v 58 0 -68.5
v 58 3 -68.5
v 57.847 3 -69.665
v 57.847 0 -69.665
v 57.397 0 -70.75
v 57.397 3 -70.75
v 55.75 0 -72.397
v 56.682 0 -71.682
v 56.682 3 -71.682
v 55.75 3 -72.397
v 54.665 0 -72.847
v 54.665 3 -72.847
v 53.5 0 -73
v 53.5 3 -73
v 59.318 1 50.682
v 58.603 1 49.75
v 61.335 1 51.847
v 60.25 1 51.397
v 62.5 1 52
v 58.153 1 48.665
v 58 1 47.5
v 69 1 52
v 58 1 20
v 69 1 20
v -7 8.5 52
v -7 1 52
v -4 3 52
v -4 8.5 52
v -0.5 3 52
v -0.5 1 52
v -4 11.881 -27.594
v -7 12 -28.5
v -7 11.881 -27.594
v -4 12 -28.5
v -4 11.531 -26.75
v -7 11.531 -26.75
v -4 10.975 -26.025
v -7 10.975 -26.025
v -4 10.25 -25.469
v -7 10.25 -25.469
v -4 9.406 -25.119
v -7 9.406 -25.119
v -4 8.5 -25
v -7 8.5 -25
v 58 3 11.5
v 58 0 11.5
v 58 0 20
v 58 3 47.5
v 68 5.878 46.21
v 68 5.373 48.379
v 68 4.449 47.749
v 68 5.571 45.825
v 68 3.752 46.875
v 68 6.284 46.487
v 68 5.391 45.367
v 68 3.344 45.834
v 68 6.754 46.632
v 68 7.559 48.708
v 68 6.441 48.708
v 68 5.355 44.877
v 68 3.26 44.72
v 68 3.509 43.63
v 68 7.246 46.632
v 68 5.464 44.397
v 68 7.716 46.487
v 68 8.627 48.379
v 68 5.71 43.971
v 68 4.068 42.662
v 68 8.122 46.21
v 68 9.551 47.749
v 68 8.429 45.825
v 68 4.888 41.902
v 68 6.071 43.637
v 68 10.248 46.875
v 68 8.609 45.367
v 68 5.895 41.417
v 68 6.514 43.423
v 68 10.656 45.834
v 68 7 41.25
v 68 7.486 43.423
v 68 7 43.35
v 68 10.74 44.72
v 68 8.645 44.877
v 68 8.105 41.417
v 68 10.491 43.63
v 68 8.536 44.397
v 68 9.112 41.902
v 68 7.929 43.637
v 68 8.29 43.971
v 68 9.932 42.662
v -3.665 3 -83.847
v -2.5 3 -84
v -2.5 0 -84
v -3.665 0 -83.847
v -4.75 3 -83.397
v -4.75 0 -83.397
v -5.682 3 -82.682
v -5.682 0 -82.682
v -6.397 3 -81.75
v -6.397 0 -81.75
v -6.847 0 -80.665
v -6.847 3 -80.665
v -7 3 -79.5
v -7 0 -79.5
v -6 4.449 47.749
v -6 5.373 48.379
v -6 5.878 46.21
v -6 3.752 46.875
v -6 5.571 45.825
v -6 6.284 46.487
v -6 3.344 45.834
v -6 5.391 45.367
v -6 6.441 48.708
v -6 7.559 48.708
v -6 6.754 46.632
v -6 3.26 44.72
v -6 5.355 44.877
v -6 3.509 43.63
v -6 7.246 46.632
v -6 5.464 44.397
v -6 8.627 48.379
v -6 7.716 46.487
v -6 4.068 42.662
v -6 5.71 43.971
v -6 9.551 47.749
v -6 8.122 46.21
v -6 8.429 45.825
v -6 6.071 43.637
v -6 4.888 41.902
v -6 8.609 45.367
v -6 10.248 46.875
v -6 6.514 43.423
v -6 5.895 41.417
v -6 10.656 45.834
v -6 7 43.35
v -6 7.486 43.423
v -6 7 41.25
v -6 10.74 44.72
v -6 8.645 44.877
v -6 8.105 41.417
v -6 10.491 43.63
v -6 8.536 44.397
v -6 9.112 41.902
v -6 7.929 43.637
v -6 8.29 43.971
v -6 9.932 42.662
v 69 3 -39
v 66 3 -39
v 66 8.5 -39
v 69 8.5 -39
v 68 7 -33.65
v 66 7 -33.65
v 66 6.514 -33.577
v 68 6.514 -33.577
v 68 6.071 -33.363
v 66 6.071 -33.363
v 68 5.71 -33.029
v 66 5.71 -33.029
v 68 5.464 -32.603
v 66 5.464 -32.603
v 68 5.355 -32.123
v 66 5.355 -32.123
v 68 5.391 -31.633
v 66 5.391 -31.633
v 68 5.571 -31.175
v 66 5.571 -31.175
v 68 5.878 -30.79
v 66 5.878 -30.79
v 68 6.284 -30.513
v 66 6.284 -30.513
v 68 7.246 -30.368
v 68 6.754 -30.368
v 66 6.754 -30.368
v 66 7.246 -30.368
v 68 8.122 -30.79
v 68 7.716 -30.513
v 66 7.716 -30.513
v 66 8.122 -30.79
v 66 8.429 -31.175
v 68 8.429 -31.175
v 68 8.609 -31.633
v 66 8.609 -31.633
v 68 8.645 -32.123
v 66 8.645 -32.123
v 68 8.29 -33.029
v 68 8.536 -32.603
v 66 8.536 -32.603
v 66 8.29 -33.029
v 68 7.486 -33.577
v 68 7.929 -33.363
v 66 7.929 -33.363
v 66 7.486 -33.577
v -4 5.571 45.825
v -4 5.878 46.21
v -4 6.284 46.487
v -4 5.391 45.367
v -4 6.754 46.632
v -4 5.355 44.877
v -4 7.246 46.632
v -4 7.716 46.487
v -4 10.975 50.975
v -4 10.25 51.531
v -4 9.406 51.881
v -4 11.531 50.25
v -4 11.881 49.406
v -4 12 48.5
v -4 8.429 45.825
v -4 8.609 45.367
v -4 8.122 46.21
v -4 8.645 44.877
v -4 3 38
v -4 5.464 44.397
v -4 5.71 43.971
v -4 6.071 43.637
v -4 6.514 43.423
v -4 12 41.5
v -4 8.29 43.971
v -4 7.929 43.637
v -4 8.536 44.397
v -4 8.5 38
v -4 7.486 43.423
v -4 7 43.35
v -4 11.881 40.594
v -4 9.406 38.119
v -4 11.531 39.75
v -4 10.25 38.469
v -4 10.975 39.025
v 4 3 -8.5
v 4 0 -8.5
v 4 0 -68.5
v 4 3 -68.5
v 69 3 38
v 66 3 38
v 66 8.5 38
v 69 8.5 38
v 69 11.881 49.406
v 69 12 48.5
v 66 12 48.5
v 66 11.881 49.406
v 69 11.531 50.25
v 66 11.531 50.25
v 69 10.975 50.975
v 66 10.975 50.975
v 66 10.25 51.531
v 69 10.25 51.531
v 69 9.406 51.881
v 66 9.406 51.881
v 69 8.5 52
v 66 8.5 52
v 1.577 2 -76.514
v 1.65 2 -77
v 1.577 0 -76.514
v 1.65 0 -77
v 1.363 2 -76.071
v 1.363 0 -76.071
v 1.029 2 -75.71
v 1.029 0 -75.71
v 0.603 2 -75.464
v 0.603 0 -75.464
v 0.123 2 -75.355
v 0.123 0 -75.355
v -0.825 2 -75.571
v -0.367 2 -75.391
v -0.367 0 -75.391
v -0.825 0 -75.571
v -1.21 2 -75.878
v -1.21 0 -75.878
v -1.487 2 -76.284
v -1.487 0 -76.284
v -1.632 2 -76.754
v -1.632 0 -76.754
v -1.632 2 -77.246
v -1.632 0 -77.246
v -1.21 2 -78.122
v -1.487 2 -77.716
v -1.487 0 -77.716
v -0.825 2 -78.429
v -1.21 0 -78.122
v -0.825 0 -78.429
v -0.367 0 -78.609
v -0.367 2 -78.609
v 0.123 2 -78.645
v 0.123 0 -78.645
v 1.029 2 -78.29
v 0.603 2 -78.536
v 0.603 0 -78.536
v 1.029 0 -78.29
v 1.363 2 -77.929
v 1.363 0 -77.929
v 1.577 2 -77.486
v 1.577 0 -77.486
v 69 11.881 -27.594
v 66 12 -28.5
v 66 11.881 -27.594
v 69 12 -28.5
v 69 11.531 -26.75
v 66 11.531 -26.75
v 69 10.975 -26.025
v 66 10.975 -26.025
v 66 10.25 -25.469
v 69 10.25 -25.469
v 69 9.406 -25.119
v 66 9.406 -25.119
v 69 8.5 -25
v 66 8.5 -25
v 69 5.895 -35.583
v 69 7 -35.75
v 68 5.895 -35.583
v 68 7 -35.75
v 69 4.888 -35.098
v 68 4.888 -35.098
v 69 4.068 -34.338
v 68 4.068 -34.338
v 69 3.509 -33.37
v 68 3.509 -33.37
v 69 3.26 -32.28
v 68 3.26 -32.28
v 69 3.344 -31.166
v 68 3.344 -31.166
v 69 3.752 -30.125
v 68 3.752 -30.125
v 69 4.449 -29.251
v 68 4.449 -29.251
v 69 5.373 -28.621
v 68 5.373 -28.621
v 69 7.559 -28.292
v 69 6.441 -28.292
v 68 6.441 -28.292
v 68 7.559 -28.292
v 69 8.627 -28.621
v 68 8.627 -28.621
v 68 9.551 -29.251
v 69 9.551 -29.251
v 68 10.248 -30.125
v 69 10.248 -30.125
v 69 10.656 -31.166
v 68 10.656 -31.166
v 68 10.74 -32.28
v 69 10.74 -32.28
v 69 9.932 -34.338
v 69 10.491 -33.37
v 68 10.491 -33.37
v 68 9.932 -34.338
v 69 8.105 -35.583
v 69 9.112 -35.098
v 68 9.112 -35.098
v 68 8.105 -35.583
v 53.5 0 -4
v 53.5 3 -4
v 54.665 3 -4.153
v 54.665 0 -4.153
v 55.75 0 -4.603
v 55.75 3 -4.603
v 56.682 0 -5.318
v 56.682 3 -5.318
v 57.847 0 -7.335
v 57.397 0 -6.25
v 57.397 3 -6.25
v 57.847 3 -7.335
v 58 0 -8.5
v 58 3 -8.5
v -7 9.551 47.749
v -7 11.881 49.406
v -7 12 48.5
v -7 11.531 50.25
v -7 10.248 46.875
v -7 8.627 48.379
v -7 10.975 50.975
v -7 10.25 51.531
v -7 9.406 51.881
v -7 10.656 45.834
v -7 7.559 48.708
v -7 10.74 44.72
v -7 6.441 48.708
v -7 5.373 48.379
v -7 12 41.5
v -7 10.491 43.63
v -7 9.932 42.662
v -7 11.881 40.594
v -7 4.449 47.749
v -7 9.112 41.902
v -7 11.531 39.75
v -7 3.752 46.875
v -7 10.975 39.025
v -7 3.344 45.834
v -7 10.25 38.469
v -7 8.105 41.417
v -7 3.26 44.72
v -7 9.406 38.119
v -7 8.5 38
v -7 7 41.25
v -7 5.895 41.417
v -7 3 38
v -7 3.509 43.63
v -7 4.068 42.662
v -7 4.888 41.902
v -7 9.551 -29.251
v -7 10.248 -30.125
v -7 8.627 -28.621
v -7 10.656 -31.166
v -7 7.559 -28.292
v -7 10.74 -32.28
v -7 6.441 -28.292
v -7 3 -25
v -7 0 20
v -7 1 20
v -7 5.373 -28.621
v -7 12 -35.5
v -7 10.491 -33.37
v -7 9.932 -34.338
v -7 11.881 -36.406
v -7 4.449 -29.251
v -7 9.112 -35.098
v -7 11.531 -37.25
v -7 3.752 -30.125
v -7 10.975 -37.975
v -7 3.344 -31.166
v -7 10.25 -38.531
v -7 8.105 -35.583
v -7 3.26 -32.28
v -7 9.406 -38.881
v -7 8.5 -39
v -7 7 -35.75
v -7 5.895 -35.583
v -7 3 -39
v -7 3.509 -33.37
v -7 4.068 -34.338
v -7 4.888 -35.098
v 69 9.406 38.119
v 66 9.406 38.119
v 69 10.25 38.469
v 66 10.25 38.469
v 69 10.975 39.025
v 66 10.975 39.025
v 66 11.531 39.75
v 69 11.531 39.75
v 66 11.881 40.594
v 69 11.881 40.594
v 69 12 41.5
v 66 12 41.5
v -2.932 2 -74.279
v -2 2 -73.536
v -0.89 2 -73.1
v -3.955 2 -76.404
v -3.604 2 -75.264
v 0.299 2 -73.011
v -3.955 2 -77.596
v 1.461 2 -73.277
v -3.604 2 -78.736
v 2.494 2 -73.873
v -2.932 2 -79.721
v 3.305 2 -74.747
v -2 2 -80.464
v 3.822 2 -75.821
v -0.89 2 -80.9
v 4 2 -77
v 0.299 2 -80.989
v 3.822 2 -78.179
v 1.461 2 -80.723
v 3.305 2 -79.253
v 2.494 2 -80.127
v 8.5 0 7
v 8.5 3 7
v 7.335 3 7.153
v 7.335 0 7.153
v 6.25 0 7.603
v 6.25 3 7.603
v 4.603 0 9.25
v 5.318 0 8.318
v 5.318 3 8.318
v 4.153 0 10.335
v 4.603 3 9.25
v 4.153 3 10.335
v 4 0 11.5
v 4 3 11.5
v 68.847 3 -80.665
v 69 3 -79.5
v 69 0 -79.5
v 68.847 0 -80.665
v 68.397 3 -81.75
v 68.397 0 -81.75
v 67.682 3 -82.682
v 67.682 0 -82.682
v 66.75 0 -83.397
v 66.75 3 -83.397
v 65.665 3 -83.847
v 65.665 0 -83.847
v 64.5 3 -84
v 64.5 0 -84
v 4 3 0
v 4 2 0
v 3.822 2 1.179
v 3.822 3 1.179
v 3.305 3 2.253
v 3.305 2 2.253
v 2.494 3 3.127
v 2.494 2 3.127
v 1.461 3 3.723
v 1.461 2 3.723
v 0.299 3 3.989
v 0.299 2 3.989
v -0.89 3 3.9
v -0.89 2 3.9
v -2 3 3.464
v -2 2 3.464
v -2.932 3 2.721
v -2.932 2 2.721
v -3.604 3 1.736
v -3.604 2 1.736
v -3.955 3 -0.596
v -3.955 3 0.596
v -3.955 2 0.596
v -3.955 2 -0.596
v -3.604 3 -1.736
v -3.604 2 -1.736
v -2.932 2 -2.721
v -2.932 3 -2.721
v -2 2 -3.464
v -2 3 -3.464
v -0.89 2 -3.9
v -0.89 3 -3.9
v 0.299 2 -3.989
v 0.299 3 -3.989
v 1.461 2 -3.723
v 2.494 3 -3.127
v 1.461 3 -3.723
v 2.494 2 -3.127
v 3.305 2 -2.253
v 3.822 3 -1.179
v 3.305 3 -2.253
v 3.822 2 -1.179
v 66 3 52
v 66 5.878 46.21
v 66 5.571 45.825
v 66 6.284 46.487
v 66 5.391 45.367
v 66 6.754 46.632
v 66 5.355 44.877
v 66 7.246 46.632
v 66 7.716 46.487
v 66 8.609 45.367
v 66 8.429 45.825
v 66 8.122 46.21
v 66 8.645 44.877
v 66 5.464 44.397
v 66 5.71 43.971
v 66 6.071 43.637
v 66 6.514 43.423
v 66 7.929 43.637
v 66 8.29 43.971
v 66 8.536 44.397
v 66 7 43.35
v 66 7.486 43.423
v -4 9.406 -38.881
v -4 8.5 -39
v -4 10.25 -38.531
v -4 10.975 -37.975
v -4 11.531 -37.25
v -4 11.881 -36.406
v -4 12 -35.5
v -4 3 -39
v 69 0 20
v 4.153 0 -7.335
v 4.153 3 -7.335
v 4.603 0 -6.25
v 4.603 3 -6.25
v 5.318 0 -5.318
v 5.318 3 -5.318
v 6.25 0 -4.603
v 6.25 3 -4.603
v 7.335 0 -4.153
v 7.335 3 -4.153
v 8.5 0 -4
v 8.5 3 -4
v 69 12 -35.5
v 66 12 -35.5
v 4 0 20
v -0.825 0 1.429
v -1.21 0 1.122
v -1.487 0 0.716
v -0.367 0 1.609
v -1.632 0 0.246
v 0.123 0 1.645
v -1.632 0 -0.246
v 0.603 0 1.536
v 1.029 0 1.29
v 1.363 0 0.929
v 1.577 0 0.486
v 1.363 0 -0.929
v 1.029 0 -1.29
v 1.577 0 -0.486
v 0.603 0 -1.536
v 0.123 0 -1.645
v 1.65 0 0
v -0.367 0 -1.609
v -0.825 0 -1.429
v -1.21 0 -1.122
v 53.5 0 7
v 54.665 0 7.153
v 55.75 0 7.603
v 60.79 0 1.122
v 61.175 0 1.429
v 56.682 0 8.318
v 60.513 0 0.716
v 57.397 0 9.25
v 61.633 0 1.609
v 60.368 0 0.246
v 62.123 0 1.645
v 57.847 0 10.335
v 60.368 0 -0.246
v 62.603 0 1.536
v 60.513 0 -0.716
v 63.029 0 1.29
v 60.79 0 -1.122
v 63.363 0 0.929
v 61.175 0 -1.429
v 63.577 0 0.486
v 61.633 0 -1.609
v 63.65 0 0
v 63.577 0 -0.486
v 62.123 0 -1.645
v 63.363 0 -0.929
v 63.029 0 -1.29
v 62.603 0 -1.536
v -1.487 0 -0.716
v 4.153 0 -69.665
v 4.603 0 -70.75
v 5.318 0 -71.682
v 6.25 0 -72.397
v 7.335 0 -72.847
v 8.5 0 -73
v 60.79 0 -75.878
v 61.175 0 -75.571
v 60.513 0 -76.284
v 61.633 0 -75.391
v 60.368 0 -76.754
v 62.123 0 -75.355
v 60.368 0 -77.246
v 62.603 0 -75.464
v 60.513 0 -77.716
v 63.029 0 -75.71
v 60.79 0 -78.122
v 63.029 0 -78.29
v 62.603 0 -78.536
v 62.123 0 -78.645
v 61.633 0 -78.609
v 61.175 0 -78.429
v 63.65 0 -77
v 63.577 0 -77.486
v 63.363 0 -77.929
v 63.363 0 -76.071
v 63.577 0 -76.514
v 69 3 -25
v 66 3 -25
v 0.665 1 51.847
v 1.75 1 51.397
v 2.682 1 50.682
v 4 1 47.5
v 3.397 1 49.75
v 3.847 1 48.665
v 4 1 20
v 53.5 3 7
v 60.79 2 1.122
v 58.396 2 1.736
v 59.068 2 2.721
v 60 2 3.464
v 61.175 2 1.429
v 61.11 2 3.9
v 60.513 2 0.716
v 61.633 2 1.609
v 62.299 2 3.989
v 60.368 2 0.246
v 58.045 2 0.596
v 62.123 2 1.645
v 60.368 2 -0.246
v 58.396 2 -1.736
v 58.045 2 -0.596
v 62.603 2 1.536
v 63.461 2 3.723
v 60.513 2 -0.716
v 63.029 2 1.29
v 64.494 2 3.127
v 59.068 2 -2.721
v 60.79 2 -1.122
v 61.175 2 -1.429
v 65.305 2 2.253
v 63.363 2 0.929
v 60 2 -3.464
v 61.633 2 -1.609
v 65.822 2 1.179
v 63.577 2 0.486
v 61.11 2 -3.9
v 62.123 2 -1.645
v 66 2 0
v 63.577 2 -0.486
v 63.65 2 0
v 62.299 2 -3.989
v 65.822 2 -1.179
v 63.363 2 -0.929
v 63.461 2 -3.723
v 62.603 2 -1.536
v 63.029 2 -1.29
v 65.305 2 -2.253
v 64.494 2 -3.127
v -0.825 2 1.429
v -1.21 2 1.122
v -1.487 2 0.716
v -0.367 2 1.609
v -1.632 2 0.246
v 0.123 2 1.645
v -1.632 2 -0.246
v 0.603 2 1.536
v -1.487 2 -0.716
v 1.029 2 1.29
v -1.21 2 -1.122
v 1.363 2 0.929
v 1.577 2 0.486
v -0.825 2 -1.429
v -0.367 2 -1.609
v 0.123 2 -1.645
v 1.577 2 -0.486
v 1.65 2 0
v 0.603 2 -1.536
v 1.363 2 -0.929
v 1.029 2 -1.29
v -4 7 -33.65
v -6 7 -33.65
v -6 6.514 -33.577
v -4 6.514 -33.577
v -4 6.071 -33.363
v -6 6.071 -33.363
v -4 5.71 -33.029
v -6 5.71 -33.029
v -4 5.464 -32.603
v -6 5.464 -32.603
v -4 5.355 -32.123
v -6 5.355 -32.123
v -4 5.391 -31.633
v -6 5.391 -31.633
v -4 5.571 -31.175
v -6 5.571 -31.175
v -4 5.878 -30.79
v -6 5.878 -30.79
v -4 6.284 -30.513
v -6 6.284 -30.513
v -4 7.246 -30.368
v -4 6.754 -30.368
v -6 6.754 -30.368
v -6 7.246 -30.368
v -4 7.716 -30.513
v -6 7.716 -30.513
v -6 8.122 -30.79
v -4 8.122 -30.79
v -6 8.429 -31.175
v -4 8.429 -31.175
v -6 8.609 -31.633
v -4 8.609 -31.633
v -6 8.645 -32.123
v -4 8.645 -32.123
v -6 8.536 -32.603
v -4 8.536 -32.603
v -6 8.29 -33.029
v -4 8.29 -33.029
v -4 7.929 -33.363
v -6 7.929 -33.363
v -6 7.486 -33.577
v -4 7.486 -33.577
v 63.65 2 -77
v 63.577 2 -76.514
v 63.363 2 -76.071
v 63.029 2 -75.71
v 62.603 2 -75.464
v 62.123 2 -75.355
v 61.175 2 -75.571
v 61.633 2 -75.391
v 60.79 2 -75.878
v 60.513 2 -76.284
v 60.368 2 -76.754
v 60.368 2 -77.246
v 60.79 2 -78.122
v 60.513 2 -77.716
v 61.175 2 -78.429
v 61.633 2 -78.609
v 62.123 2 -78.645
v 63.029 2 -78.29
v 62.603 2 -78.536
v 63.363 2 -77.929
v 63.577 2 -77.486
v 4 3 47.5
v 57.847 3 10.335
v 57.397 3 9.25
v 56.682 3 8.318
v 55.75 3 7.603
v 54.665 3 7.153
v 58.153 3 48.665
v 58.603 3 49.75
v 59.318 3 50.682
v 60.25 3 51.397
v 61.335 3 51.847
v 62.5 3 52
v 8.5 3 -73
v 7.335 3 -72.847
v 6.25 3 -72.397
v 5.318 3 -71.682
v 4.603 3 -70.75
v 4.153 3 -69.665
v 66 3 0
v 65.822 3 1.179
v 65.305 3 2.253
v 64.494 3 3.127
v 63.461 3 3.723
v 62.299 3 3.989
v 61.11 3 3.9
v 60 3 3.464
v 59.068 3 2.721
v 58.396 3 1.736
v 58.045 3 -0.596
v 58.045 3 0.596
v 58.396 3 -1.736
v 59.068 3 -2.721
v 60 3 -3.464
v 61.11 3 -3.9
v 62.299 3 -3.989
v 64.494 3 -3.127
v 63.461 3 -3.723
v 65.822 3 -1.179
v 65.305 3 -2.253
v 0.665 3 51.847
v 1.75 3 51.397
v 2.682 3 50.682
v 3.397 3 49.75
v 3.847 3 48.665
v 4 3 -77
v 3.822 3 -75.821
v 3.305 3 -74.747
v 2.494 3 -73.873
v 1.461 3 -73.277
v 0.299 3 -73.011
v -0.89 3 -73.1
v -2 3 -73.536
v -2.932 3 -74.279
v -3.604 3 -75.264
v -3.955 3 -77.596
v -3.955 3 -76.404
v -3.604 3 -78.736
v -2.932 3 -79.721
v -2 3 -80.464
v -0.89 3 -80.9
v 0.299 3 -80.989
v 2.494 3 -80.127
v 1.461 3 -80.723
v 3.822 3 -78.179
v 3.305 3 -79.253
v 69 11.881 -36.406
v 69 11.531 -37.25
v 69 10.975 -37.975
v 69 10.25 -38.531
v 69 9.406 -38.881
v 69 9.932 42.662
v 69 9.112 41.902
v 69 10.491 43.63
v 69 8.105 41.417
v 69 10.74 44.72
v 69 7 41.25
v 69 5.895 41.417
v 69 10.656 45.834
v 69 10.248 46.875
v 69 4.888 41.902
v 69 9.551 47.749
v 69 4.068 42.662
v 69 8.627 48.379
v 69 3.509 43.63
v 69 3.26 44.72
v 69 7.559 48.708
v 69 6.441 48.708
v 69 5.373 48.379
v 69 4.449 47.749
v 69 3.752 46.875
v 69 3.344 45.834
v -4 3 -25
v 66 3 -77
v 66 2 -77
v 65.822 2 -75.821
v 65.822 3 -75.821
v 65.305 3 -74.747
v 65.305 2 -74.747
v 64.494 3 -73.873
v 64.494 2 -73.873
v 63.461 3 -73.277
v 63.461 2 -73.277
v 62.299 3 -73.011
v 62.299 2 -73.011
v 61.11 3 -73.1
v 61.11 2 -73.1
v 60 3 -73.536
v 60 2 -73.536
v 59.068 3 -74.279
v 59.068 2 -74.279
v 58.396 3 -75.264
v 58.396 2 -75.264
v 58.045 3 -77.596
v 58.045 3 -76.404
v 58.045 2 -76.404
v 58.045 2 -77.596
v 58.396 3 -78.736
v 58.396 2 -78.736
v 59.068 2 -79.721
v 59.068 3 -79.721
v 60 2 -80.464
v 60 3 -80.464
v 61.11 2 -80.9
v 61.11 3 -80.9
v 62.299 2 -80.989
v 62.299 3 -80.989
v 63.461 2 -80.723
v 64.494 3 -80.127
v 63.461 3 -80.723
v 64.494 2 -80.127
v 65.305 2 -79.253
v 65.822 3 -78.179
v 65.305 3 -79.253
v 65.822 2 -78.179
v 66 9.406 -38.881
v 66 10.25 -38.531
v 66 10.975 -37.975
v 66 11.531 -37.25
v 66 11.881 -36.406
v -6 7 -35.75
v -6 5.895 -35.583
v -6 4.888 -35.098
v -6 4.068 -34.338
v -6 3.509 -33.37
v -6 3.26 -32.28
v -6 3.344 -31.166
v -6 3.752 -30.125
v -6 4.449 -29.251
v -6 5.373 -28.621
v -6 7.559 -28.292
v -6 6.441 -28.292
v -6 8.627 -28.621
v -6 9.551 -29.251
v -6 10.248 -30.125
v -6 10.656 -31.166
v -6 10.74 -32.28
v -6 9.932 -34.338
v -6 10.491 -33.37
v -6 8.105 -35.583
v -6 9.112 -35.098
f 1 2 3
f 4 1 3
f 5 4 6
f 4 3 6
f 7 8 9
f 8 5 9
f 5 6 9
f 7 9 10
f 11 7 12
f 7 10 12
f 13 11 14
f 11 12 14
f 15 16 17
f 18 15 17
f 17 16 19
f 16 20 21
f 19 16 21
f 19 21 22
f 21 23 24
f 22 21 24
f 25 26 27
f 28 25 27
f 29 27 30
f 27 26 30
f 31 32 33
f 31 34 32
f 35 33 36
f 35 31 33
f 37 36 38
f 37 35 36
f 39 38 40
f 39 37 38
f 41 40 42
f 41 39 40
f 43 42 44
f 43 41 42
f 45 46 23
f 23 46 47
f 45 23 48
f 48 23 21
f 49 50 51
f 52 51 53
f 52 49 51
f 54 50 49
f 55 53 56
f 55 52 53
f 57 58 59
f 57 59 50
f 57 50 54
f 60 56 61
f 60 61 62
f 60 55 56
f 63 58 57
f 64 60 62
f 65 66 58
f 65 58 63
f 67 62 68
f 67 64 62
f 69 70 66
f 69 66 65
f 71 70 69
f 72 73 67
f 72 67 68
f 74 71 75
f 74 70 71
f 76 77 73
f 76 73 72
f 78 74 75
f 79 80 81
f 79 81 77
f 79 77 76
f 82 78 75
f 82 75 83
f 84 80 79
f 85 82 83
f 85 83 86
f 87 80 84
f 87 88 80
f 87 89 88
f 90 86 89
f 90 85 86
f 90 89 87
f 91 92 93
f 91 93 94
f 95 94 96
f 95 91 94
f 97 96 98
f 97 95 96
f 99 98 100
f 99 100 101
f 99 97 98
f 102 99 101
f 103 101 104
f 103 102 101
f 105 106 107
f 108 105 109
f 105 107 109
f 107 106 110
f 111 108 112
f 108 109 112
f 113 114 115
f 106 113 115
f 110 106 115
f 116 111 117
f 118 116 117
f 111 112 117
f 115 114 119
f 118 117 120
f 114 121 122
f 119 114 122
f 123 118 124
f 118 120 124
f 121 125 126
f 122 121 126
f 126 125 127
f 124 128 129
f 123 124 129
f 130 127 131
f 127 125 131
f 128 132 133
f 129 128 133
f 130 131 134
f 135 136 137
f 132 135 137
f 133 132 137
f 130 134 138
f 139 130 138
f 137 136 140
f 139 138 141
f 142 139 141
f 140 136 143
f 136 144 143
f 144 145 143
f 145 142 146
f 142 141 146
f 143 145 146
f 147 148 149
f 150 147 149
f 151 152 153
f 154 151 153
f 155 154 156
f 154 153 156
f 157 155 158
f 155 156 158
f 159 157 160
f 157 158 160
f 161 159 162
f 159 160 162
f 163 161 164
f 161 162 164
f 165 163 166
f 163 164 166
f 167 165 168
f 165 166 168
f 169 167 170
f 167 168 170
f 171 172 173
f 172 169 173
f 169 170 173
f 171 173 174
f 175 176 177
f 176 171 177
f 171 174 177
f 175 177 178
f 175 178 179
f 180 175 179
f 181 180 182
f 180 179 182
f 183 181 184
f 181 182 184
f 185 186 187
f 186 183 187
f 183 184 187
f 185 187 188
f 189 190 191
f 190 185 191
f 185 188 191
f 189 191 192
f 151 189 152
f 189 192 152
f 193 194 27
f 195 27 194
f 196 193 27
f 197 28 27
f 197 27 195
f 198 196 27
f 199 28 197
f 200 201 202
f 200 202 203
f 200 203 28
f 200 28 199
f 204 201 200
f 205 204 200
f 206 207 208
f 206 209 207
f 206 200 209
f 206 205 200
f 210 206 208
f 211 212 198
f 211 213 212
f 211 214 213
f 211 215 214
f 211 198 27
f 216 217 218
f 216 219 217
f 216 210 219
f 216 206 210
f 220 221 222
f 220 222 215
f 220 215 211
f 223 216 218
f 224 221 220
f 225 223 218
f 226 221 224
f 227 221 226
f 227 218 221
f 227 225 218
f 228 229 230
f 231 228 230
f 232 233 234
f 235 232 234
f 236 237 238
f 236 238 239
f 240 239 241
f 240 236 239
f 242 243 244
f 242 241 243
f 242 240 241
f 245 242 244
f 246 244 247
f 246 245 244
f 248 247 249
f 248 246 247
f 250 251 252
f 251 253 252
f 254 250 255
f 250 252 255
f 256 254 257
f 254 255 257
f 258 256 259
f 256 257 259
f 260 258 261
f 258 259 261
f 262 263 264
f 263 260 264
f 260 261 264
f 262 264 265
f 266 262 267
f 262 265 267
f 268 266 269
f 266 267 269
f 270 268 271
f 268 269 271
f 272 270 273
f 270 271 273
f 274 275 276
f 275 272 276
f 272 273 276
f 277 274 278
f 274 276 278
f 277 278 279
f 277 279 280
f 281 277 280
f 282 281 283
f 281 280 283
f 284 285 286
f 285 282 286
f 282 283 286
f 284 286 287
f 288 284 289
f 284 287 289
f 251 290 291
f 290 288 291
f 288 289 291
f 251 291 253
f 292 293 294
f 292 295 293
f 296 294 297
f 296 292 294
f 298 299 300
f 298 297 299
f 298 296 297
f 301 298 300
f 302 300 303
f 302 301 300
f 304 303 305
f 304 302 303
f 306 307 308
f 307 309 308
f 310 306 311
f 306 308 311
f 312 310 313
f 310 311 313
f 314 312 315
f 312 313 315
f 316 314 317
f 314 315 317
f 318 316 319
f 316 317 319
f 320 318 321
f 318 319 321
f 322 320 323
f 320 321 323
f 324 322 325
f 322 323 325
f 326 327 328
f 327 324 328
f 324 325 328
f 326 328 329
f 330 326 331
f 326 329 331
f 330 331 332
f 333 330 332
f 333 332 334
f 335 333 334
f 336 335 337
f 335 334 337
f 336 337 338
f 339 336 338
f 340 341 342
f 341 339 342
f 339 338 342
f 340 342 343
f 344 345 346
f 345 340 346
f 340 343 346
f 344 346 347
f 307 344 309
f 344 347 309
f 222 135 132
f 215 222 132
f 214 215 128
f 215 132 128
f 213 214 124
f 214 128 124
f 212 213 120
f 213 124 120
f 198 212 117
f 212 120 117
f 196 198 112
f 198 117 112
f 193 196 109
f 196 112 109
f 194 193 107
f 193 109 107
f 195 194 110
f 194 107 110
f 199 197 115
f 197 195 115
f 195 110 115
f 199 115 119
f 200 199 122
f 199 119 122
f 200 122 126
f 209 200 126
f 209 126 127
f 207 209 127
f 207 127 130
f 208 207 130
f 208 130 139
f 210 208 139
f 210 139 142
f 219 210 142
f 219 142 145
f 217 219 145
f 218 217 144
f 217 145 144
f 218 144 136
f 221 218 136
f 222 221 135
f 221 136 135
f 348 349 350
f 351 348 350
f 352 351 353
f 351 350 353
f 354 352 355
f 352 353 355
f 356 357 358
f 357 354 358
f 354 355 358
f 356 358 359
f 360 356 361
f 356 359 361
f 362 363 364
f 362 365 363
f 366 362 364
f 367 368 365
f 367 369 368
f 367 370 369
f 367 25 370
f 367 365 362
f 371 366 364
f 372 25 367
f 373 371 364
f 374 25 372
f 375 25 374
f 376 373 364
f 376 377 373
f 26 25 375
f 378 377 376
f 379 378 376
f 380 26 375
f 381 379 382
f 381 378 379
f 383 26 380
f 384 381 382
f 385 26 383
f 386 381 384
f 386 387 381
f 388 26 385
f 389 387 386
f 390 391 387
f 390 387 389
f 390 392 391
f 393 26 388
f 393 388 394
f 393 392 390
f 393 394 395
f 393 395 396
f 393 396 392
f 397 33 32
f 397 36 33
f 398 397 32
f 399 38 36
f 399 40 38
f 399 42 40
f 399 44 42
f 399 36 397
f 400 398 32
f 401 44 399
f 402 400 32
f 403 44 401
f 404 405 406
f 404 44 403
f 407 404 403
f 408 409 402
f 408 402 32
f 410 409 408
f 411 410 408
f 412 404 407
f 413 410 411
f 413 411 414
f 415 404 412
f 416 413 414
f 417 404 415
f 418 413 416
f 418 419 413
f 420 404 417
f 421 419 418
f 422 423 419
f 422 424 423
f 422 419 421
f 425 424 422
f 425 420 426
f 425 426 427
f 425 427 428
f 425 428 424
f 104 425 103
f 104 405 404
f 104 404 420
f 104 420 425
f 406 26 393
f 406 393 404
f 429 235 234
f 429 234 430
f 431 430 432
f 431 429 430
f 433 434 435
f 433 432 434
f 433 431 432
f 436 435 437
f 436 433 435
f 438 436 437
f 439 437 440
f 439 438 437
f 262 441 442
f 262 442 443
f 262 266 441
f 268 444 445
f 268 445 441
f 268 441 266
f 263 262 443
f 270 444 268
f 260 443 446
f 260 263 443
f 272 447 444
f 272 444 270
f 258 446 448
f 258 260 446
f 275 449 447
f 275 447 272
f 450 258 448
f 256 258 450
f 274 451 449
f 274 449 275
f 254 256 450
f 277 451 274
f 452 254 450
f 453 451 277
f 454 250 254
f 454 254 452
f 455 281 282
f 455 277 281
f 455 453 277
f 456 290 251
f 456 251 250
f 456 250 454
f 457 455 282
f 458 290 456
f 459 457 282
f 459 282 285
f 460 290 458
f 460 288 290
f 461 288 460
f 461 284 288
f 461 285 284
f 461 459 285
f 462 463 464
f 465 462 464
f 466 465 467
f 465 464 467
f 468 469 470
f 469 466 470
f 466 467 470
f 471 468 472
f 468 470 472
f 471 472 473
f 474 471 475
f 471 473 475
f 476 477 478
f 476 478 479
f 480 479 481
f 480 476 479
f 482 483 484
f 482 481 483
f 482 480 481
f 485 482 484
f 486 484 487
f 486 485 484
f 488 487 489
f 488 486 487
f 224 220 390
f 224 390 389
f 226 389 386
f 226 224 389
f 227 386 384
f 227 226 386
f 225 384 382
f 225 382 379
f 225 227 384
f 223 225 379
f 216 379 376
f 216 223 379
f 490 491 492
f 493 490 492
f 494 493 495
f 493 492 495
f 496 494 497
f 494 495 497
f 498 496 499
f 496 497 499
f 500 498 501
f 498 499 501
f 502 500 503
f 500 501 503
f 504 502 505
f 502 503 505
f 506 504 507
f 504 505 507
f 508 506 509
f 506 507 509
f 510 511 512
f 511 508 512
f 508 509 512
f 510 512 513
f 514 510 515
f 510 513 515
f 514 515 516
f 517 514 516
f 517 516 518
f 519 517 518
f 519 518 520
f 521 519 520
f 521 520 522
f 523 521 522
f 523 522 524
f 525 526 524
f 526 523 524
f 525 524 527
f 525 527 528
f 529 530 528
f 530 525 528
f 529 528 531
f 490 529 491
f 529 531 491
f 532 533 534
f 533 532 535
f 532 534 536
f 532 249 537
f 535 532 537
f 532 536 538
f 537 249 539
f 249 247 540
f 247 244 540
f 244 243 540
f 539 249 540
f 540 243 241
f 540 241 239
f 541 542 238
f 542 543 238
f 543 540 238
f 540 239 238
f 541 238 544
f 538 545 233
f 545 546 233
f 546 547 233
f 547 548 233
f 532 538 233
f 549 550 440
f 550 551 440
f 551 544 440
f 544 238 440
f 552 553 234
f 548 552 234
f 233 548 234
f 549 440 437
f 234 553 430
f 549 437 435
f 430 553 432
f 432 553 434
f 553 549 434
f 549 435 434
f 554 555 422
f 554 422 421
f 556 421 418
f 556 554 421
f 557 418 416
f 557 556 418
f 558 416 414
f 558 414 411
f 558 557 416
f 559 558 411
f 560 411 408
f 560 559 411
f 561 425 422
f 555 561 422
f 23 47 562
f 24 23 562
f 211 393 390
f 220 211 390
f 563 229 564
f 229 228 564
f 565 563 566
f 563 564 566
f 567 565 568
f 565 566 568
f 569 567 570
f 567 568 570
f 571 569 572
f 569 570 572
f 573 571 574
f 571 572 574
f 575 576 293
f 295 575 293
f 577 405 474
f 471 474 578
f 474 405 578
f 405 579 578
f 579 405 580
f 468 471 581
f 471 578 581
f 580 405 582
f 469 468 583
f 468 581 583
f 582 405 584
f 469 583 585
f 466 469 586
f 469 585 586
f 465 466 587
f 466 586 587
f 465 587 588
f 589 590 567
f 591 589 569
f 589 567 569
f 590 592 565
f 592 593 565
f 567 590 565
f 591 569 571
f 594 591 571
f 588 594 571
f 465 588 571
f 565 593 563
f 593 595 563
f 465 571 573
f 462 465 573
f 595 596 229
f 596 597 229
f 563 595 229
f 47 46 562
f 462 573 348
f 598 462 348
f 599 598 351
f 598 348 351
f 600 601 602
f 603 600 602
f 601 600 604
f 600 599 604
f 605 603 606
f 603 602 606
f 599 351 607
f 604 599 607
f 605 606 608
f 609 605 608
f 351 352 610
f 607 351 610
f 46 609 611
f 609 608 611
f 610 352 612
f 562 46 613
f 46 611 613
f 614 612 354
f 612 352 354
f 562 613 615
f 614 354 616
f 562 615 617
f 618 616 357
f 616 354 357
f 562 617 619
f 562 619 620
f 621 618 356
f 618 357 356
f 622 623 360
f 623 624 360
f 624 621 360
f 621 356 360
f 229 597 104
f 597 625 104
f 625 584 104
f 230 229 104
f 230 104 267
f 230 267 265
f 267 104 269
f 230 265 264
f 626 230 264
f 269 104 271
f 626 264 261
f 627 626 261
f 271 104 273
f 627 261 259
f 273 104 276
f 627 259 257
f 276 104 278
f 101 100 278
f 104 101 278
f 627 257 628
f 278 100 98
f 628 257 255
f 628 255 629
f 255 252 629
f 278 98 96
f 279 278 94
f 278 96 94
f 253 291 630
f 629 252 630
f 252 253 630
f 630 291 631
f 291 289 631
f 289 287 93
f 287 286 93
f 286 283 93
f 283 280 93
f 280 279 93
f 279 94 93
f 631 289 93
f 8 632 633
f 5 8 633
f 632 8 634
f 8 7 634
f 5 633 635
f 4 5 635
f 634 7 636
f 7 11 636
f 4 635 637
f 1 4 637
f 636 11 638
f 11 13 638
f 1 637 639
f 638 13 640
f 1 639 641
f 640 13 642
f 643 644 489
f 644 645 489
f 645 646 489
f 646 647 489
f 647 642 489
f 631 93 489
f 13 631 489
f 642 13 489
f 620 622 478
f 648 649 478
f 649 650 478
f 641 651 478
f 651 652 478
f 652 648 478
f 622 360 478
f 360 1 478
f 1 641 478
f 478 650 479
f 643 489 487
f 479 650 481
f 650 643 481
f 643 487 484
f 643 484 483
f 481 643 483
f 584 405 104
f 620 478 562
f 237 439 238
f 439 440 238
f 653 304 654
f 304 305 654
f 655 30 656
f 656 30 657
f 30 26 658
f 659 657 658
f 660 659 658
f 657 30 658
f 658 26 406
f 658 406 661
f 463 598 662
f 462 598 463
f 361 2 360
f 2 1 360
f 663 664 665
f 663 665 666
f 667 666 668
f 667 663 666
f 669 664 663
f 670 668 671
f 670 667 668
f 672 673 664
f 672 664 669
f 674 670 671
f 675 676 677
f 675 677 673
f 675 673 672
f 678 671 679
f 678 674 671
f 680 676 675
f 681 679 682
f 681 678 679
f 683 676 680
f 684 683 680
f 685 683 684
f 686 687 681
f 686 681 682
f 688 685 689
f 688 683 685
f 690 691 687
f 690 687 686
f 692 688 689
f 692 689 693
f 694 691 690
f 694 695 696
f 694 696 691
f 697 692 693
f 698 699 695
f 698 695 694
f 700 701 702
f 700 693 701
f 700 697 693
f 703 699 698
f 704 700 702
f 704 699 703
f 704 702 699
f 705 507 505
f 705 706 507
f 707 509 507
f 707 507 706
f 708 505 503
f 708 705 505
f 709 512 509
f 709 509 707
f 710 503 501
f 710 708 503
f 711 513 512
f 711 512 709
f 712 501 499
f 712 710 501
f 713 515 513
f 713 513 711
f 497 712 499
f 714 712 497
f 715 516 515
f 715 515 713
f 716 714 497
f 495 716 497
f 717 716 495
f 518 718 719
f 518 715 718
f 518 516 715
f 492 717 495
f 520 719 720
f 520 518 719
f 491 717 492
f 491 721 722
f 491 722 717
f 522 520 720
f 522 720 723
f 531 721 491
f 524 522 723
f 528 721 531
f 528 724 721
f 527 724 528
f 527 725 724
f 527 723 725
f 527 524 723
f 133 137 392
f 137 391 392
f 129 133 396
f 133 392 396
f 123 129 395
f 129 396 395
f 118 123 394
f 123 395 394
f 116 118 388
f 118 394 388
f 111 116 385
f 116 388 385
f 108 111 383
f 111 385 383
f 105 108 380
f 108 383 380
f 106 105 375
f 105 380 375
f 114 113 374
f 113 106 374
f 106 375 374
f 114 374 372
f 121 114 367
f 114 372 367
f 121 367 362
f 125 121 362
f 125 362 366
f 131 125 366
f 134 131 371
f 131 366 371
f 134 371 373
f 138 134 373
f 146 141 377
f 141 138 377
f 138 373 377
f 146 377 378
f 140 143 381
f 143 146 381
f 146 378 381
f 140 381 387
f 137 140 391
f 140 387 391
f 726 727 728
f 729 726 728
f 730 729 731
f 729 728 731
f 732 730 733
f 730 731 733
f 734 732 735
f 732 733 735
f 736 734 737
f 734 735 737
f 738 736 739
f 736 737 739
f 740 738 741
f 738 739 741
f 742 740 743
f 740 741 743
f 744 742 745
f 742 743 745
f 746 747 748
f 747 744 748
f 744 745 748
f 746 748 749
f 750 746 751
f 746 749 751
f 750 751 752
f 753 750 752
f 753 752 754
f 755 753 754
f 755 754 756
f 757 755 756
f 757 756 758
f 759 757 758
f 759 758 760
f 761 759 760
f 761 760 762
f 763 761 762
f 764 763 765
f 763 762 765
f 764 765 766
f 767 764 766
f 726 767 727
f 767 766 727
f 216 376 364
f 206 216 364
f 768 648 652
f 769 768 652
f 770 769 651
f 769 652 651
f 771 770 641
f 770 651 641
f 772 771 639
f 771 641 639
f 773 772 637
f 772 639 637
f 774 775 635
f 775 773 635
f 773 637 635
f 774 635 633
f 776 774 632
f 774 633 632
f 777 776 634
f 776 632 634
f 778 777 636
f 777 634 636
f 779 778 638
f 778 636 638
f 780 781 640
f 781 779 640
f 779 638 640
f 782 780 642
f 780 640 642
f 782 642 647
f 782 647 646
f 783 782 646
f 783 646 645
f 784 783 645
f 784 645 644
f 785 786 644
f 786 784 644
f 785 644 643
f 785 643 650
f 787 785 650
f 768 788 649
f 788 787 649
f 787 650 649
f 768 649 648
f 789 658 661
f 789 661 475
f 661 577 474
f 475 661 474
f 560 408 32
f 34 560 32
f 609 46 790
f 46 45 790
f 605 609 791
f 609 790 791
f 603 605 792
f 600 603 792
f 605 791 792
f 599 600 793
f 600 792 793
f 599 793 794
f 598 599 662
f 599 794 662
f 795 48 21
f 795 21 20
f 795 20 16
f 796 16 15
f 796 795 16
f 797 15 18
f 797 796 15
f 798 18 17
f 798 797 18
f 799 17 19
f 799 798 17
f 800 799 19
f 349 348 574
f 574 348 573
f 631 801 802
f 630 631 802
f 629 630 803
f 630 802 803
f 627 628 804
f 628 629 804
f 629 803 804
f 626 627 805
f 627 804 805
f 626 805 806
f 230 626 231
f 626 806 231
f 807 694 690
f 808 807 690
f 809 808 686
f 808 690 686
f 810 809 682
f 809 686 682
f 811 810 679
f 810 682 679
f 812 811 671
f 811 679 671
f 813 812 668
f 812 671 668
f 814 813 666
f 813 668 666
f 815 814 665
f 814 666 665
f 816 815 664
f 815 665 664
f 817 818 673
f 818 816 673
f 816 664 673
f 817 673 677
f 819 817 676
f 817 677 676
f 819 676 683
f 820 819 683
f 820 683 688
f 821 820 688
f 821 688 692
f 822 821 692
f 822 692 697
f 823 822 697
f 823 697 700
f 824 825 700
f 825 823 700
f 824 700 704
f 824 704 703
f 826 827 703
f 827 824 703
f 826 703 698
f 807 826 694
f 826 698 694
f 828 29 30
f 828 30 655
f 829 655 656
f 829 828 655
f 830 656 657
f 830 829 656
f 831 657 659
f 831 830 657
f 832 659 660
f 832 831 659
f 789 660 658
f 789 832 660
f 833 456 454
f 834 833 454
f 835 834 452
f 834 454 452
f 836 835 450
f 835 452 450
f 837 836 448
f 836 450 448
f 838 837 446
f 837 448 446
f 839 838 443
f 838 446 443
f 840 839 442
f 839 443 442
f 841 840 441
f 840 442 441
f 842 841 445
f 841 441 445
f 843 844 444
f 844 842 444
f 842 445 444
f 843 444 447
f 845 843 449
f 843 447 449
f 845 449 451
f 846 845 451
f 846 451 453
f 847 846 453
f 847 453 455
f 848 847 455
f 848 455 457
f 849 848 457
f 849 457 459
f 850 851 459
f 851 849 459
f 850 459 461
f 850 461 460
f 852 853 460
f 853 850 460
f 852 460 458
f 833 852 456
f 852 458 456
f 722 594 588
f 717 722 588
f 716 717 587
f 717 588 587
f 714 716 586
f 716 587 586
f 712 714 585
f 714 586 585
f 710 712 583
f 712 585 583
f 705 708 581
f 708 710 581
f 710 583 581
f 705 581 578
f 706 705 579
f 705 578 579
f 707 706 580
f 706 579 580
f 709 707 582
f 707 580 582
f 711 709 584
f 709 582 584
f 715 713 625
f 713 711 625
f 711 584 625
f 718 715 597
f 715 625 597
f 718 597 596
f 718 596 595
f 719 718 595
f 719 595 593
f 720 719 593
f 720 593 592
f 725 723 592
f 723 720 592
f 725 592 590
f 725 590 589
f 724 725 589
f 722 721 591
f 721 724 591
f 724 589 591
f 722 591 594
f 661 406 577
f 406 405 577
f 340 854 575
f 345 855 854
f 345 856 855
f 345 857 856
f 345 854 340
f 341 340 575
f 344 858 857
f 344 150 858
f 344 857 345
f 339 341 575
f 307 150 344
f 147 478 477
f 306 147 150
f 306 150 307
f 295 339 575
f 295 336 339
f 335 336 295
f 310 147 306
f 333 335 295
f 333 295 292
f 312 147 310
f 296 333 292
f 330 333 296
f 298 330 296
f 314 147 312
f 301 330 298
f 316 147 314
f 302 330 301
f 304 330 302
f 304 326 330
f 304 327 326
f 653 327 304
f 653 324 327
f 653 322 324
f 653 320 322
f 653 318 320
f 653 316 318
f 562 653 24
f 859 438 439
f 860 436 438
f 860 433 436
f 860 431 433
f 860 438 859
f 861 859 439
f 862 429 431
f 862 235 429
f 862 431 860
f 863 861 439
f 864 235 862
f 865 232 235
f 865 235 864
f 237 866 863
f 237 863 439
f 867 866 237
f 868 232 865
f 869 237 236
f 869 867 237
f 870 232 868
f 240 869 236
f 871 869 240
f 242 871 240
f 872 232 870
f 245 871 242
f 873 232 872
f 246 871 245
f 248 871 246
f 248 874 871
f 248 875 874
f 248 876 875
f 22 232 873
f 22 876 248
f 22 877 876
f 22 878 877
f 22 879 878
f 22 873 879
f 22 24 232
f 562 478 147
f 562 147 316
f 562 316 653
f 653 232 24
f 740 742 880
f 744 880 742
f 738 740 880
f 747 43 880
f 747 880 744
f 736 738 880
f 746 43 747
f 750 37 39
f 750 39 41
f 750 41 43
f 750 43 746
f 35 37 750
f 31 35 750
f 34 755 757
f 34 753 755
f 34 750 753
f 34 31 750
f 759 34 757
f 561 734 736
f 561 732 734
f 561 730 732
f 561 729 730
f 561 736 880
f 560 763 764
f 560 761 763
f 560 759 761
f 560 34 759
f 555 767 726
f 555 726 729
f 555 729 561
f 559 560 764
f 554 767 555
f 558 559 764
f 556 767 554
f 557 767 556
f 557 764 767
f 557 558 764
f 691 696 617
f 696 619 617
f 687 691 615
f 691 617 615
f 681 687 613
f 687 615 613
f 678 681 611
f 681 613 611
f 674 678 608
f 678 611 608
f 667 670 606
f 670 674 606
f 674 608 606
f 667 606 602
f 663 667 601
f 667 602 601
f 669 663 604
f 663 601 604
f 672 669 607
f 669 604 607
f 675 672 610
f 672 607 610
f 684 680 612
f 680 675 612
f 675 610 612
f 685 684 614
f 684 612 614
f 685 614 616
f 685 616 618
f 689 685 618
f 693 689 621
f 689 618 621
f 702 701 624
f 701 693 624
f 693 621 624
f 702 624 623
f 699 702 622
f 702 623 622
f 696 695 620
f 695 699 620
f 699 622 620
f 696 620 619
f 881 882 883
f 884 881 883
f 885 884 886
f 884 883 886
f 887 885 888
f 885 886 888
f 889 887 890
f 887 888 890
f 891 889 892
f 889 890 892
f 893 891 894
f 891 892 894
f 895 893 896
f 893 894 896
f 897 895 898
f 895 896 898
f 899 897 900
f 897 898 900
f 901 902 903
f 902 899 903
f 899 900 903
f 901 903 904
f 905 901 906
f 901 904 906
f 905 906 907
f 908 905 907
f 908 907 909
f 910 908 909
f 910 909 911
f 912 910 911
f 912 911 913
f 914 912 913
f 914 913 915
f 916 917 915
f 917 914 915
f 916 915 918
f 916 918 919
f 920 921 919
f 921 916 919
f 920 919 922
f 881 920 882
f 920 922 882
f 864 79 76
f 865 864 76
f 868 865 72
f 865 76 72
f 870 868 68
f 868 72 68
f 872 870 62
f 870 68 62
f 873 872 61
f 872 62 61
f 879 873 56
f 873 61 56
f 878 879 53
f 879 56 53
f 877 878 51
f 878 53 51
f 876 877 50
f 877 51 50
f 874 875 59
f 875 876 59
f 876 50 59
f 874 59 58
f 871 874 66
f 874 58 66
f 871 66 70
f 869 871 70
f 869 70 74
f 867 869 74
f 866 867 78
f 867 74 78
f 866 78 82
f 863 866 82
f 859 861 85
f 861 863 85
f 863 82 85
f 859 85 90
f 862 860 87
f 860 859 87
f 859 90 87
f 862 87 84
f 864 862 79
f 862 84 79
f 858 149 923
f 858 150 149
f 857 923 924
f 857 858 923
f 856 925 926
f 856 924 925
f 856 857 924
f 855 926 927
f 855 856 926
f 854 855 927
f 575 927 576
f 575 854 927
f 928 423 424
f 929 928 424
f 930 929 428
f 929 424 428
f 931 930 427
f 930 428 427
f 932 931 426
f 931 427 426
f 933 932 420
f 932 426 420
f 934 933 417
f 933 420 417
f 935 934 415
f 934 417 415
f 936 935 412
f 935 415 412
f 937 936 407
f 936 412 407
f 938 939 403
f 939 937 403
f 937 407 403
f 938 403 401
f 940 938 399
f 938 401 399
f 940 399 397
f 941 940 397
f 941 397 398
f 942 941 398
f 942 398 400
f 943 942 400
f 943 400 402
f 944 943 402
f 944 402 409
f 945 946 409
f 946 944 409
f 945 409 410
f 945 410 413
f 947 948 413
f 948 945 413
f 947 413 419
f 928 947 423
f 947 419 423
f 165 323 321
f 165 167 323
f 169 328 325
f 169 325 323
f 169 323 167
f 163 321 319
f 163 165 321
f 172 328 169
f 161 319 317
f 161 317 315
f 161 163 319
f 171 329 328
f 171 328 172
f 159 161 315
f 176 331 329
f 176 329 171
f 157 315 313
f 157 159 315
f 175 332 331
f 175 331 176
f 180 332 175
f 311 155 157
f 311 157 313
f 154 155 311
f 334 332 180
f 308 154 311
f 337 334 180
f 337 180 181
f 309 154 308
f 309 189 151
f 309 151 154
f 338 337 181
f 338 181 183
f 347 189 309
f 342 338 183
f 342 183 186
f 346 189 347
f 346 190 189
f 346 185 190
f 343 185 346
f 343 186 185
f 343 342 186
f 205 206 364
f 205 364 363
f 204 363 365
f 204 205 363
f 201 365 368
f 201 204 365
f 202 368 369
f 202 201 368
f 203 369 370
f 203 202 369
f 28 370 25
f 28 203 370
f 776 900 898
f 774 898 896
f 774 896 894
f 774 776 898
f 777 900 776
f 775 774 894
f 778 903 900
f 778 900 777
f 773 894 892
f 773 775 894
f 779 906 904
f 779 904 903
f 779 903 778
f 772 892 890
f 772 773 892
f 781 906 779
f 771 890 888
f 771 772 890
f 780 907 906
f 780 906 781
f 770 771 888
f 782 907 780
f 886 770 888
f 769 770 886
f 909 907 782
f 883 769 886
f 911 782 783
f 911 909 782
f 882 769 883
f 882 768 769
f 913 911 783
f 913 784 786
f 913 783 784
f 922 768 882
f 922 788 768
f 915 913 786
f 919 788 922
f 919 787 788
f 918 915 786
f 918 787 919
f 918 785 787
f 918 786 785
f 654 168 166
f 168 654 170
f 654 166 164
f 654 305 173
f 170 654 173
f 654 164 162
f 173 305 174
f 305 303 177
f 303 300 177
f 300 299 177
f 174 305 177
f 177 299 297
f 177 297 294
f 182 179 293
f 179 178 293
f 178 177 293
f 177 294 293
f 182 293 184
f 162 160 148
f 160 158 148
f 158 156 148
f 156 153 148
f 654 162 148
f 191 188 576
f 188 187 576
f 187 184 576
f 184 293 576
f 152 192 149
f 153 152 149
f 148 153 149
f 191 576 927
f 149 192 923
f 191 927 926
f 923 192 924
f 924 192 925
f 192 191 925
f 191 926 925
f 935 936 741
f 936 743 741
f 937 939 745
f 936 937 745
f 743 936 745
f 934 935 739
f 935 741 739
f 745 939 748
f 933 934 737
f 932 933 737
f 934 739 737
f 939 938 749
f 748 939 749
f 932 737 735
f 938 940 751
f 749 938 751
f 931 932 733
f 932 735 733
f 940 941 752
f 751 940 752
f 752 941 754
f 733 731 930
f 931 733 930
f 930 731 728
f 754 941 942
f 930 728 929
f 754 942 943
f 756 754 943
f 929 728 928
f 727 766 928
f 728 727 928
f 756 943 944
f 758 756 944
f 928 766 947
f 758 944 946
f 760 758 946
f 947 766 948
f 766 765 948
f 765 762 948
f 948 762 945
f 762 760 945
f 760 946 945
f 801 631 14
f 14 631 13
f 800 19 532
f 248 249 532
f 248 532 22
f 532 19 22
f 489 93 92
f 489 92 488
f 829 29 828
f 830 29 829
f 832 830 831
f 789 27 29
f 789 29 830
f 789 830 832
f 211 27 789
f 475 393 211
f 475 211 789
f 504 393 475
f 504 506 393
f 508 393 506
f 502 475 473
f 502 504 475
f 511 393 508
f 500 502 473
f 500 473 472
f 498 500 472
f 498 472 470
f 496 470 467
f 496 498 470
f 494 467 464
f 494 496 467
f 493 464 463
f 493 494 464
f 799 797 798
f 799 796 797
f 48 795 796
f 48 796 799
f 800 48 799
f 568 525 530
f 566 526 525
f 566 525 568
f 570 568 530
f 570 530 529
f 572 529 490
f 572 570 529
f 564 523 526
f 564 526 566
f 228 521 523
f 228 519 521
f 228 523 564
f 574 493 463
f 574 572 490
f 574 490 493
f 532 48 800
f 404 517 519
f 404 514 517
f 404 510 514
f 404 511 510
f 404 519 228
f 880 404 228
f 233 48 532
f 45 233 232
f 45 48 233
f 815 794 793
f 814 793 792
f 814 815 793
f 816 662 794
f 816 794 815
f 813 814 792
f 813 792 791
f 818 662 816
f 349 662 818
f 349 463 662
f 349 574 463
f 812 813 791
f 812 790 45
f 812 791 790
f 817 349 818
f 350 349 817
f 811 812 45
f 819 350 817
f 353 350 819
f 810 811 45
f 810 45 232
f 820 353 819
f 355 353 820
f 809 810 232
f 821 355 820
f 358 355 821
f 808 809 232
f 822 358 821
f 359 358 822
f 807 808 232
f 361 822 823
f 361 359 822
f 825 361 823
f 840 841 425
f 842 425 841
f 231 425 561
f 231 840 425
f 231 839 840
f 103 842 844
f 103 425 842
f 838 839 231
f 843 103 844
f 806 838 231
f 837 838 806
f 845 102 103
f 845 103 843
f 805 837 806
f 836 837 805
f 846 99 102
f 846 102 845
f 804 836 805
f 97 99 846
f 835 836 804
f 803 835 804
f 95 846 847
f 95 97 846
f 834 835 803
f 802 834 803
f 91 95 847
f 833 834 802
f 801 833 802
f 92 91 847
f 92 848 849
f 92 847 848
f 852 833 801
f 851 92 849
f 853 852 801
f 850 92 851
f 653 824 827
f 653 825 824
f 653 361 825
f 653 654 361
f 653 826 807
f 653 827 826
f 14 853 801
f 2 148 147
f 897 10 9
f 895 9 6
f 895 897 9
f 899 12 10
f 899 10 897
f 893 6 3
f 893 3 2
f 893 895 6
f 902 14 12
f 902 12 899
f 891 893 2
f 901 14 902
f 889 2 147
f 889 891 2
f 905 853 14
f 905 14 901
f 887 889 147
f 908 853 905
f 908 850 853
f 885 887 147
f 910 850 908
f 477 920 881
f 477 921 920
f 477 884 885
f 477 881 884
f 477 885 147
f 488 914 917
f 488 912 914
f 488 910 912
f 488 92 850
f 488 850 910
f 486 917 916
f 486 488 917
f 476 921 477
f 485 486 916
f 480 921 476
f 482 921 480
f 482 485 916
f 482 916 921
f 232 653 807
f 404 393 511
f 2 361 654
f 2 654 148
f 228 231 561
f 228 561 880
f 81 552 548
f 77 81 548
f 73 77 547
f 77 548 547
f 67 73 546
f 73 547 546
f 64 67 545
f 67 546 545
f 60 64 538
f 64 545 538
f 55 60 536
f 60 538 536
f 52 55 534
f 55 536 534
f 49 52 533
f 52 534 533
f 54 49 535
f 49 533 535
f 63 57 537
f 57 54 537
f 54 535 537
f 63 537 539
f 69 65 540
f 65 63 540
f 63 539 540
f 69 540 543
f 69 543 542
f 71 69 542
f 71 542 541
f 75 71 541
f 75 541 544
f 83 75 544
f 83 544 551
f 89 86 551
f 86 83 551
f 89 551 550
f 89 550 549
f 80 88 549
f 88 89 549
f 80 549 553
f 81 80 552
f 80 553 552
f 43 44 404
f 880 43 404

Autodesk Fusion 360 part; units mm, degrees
ref_plane "WorkPlane1" through (0, 12, 0) normal (0, 1, 0) x (0, 0, 1)
sketch "Sketch1" plane through (0, 0, 0) normal (0, 1, 0) x (1, 0, 0)
  circle A0 centre (0, 0) radius 1.65
  circle A1 centre (0, 0) radius 4
  circle A2 centre (0, 77) radius 1.65
  circle A3 centre (0, 77) radius 4
  circle A4 centre (62, 0) radius 1.65
  circle A5 centre (62, 0) radius 4
  circle A6 centre (62, 77) radius 4
  circle A7 centre (62, 77) radius 1.65
  line L0 (-7, 84) -> (69, 84)
  line L1 (69, 84) -> (69, -7)
  line L2 (69, -7) -> (-7, -7)
  line L3 (-7, -7) -> (-7, 84)
  line L4 (4, 73) -> (58, 73)
  line L5 (58, 73) -> (58, 4)
  line L6 (58, 4) -> (4, 4)
  line L7 (4, 4) -> (4, 73)
  line L8 (-7, -52) -> (4, -52)
  line L9 (4, -52) -> (4, -7)
  line L10 (4, -7) -> (-7, -7)
  line L11 (-7, -7) -> (-7, -52)
  line L12 (69, -7) -> (58, -7)
  line L13 (58, -7) -> (58, -52)
  line L14 (58, -52) -> (69, -52)
  line L15 (69, -52) -> (69, -7)
  line L16 (-7, -20) -> (69, -20)
  line L17 (69, -20) -> (69, -52)
  line L18 (69, -52) -> (-7, -52)
  line L19 (-7, -52) -> (-7, -20)
  dimension "d1" = 3.3
  dimension "d2" = 8
  dimension "d3" = 3.3
  dimension "d4" = 8
  dimension "d5" = 77
  dimension "d6" = 3.3
  dimension "d7" = 8
  dimension "d8" = 62
  dimension "d9" = 3.3
  dimension "d10" = 8
  dimension "d11" = 77
  dimension "d12" = 7
  dimension "d13" = 7
  dimension "d14" = 7
  dimension "d15" = 7
  dimension "d16" = 4
  dimension "d17" = 4
  dimension "d18" = 4
  dimension "d19" = 4
  dimension "d52" = 45
  dimension "d53" = 11
  dimension "d54" = 45
  dimension "d55" = 11
  dimension "d65" = 20
extrude "Extrude1" add sketch "Sketch1" along normal blind 3 contours L0 L1 L2 L3 L10 L12 | L2 L9 L10 L11 L16 | L2 L12 L13 L15 L16 | L8 L9 L11 L16 L18 L19 | L13 L14 L15 L16 L17 L18
extrude "Extrude2" add sketch "Sketch1" along normal blind 2 contours A1 | A3 | A5 | A6
sketch "Sketch3" plane through (0, 0, 0) normal (1, 0, 0) x (0, 0, -1)
  circle A0 centre (32, 7) radius 1.65
  circle A1 centre (32, 7) radius 3.75
  line L0 (84, 0) -> (-52, 0)
  line L1 (77, 0) -> (32, 0)
  line L2 (39, 12) -> (25, 12)
  line L3 (25, 12) -> (25, 3)
  line L4 (25, 3) -> (39, 3)
  line L5 (39, 3) -> (39, 12)
  line L6 (4, 3) -> (73, 3)
  circle A2 centre (-45, 7) radius 1.65
  circle A3 centre (-45, 7) radius 3.75
  line L7 (32, 0) -> (-45, 0)
  line L8 (-38, 12) -> (-52, 12)
  line L9 (-52, 12) -> (-52, 0)
  line L10 (-52, 0) -> (-38, 0)
  line L11 (-38, 0) -> (-38, 12)
  line L12 (-7, 0) -> (-52, 0)
  point P0 (77, 0)
  dimension "d24" = 3.3
  dimension "d25" = 7.5
  dimension "d27" = 45
  dimension "d28" = 7
  dimension "d29" = 5
  dimension "d30" = 7
  dimension "d31" = 7
  dimension "d32" = 3.3
  dimension "d33" = 7.5
  dimension "d34" = 77
  dimension "d35" = 7
  dimension "d36" = 5
  dimension "d37" = 7
  dimension "d38" = 7
extrude "Extrude3" add sketch "Sketch3" along normal blind 3 from surface at -7 contours L0 L7 L8 L9 L10 L11 L12 | L2 L3 L4 L5 L6
extrude "Extrude5" add sketch "Sketch3" along normal blind 2 from surface at -6 contours A1 | A3
extrude "Extrude6" add sketch "Sketch3" along normal blind 3 from surface at 66 contours L0 L7 L8 L9 L10 L11 L12 | L2 L3 L4 L5 L6
extrude "Extrude7" add sketch "Sketch3" along normal blind 2 from surface at 66 contours A1 | A3
fillet "Fillet1" radius 4.5 4 edges at (-7, 1.5, -84) (69, 1.5, -84) (4, 1.5, 52) (58, 1.5, 52)
fillet "Fillet2" radius 4.5 6 edges at (4, 1.5, -73) (4, 1.5, -4) (58, 1.5, -4) (58, 1.5, -73) (4, 1.5, 7) (58, 1.5, 7)
extrude "Extrude8" cut sketch "Sketch1" along normal blind 1 contours L8 L9 L11 L16 L18 L19 | L13 L14 L15 L16 L17 L18 | L9 L13 L16 L18
fillet "Fillet3" radius 3.5 8 edges at (67.5, 12, -25) (-5.5, 12, -25) (-5.5, 12, 52) (-5.5, 12, 38) (67.5, 12, 52) (67.5, 12, 38) (67.5, 12, -39) (-5.5, 12, -39)
